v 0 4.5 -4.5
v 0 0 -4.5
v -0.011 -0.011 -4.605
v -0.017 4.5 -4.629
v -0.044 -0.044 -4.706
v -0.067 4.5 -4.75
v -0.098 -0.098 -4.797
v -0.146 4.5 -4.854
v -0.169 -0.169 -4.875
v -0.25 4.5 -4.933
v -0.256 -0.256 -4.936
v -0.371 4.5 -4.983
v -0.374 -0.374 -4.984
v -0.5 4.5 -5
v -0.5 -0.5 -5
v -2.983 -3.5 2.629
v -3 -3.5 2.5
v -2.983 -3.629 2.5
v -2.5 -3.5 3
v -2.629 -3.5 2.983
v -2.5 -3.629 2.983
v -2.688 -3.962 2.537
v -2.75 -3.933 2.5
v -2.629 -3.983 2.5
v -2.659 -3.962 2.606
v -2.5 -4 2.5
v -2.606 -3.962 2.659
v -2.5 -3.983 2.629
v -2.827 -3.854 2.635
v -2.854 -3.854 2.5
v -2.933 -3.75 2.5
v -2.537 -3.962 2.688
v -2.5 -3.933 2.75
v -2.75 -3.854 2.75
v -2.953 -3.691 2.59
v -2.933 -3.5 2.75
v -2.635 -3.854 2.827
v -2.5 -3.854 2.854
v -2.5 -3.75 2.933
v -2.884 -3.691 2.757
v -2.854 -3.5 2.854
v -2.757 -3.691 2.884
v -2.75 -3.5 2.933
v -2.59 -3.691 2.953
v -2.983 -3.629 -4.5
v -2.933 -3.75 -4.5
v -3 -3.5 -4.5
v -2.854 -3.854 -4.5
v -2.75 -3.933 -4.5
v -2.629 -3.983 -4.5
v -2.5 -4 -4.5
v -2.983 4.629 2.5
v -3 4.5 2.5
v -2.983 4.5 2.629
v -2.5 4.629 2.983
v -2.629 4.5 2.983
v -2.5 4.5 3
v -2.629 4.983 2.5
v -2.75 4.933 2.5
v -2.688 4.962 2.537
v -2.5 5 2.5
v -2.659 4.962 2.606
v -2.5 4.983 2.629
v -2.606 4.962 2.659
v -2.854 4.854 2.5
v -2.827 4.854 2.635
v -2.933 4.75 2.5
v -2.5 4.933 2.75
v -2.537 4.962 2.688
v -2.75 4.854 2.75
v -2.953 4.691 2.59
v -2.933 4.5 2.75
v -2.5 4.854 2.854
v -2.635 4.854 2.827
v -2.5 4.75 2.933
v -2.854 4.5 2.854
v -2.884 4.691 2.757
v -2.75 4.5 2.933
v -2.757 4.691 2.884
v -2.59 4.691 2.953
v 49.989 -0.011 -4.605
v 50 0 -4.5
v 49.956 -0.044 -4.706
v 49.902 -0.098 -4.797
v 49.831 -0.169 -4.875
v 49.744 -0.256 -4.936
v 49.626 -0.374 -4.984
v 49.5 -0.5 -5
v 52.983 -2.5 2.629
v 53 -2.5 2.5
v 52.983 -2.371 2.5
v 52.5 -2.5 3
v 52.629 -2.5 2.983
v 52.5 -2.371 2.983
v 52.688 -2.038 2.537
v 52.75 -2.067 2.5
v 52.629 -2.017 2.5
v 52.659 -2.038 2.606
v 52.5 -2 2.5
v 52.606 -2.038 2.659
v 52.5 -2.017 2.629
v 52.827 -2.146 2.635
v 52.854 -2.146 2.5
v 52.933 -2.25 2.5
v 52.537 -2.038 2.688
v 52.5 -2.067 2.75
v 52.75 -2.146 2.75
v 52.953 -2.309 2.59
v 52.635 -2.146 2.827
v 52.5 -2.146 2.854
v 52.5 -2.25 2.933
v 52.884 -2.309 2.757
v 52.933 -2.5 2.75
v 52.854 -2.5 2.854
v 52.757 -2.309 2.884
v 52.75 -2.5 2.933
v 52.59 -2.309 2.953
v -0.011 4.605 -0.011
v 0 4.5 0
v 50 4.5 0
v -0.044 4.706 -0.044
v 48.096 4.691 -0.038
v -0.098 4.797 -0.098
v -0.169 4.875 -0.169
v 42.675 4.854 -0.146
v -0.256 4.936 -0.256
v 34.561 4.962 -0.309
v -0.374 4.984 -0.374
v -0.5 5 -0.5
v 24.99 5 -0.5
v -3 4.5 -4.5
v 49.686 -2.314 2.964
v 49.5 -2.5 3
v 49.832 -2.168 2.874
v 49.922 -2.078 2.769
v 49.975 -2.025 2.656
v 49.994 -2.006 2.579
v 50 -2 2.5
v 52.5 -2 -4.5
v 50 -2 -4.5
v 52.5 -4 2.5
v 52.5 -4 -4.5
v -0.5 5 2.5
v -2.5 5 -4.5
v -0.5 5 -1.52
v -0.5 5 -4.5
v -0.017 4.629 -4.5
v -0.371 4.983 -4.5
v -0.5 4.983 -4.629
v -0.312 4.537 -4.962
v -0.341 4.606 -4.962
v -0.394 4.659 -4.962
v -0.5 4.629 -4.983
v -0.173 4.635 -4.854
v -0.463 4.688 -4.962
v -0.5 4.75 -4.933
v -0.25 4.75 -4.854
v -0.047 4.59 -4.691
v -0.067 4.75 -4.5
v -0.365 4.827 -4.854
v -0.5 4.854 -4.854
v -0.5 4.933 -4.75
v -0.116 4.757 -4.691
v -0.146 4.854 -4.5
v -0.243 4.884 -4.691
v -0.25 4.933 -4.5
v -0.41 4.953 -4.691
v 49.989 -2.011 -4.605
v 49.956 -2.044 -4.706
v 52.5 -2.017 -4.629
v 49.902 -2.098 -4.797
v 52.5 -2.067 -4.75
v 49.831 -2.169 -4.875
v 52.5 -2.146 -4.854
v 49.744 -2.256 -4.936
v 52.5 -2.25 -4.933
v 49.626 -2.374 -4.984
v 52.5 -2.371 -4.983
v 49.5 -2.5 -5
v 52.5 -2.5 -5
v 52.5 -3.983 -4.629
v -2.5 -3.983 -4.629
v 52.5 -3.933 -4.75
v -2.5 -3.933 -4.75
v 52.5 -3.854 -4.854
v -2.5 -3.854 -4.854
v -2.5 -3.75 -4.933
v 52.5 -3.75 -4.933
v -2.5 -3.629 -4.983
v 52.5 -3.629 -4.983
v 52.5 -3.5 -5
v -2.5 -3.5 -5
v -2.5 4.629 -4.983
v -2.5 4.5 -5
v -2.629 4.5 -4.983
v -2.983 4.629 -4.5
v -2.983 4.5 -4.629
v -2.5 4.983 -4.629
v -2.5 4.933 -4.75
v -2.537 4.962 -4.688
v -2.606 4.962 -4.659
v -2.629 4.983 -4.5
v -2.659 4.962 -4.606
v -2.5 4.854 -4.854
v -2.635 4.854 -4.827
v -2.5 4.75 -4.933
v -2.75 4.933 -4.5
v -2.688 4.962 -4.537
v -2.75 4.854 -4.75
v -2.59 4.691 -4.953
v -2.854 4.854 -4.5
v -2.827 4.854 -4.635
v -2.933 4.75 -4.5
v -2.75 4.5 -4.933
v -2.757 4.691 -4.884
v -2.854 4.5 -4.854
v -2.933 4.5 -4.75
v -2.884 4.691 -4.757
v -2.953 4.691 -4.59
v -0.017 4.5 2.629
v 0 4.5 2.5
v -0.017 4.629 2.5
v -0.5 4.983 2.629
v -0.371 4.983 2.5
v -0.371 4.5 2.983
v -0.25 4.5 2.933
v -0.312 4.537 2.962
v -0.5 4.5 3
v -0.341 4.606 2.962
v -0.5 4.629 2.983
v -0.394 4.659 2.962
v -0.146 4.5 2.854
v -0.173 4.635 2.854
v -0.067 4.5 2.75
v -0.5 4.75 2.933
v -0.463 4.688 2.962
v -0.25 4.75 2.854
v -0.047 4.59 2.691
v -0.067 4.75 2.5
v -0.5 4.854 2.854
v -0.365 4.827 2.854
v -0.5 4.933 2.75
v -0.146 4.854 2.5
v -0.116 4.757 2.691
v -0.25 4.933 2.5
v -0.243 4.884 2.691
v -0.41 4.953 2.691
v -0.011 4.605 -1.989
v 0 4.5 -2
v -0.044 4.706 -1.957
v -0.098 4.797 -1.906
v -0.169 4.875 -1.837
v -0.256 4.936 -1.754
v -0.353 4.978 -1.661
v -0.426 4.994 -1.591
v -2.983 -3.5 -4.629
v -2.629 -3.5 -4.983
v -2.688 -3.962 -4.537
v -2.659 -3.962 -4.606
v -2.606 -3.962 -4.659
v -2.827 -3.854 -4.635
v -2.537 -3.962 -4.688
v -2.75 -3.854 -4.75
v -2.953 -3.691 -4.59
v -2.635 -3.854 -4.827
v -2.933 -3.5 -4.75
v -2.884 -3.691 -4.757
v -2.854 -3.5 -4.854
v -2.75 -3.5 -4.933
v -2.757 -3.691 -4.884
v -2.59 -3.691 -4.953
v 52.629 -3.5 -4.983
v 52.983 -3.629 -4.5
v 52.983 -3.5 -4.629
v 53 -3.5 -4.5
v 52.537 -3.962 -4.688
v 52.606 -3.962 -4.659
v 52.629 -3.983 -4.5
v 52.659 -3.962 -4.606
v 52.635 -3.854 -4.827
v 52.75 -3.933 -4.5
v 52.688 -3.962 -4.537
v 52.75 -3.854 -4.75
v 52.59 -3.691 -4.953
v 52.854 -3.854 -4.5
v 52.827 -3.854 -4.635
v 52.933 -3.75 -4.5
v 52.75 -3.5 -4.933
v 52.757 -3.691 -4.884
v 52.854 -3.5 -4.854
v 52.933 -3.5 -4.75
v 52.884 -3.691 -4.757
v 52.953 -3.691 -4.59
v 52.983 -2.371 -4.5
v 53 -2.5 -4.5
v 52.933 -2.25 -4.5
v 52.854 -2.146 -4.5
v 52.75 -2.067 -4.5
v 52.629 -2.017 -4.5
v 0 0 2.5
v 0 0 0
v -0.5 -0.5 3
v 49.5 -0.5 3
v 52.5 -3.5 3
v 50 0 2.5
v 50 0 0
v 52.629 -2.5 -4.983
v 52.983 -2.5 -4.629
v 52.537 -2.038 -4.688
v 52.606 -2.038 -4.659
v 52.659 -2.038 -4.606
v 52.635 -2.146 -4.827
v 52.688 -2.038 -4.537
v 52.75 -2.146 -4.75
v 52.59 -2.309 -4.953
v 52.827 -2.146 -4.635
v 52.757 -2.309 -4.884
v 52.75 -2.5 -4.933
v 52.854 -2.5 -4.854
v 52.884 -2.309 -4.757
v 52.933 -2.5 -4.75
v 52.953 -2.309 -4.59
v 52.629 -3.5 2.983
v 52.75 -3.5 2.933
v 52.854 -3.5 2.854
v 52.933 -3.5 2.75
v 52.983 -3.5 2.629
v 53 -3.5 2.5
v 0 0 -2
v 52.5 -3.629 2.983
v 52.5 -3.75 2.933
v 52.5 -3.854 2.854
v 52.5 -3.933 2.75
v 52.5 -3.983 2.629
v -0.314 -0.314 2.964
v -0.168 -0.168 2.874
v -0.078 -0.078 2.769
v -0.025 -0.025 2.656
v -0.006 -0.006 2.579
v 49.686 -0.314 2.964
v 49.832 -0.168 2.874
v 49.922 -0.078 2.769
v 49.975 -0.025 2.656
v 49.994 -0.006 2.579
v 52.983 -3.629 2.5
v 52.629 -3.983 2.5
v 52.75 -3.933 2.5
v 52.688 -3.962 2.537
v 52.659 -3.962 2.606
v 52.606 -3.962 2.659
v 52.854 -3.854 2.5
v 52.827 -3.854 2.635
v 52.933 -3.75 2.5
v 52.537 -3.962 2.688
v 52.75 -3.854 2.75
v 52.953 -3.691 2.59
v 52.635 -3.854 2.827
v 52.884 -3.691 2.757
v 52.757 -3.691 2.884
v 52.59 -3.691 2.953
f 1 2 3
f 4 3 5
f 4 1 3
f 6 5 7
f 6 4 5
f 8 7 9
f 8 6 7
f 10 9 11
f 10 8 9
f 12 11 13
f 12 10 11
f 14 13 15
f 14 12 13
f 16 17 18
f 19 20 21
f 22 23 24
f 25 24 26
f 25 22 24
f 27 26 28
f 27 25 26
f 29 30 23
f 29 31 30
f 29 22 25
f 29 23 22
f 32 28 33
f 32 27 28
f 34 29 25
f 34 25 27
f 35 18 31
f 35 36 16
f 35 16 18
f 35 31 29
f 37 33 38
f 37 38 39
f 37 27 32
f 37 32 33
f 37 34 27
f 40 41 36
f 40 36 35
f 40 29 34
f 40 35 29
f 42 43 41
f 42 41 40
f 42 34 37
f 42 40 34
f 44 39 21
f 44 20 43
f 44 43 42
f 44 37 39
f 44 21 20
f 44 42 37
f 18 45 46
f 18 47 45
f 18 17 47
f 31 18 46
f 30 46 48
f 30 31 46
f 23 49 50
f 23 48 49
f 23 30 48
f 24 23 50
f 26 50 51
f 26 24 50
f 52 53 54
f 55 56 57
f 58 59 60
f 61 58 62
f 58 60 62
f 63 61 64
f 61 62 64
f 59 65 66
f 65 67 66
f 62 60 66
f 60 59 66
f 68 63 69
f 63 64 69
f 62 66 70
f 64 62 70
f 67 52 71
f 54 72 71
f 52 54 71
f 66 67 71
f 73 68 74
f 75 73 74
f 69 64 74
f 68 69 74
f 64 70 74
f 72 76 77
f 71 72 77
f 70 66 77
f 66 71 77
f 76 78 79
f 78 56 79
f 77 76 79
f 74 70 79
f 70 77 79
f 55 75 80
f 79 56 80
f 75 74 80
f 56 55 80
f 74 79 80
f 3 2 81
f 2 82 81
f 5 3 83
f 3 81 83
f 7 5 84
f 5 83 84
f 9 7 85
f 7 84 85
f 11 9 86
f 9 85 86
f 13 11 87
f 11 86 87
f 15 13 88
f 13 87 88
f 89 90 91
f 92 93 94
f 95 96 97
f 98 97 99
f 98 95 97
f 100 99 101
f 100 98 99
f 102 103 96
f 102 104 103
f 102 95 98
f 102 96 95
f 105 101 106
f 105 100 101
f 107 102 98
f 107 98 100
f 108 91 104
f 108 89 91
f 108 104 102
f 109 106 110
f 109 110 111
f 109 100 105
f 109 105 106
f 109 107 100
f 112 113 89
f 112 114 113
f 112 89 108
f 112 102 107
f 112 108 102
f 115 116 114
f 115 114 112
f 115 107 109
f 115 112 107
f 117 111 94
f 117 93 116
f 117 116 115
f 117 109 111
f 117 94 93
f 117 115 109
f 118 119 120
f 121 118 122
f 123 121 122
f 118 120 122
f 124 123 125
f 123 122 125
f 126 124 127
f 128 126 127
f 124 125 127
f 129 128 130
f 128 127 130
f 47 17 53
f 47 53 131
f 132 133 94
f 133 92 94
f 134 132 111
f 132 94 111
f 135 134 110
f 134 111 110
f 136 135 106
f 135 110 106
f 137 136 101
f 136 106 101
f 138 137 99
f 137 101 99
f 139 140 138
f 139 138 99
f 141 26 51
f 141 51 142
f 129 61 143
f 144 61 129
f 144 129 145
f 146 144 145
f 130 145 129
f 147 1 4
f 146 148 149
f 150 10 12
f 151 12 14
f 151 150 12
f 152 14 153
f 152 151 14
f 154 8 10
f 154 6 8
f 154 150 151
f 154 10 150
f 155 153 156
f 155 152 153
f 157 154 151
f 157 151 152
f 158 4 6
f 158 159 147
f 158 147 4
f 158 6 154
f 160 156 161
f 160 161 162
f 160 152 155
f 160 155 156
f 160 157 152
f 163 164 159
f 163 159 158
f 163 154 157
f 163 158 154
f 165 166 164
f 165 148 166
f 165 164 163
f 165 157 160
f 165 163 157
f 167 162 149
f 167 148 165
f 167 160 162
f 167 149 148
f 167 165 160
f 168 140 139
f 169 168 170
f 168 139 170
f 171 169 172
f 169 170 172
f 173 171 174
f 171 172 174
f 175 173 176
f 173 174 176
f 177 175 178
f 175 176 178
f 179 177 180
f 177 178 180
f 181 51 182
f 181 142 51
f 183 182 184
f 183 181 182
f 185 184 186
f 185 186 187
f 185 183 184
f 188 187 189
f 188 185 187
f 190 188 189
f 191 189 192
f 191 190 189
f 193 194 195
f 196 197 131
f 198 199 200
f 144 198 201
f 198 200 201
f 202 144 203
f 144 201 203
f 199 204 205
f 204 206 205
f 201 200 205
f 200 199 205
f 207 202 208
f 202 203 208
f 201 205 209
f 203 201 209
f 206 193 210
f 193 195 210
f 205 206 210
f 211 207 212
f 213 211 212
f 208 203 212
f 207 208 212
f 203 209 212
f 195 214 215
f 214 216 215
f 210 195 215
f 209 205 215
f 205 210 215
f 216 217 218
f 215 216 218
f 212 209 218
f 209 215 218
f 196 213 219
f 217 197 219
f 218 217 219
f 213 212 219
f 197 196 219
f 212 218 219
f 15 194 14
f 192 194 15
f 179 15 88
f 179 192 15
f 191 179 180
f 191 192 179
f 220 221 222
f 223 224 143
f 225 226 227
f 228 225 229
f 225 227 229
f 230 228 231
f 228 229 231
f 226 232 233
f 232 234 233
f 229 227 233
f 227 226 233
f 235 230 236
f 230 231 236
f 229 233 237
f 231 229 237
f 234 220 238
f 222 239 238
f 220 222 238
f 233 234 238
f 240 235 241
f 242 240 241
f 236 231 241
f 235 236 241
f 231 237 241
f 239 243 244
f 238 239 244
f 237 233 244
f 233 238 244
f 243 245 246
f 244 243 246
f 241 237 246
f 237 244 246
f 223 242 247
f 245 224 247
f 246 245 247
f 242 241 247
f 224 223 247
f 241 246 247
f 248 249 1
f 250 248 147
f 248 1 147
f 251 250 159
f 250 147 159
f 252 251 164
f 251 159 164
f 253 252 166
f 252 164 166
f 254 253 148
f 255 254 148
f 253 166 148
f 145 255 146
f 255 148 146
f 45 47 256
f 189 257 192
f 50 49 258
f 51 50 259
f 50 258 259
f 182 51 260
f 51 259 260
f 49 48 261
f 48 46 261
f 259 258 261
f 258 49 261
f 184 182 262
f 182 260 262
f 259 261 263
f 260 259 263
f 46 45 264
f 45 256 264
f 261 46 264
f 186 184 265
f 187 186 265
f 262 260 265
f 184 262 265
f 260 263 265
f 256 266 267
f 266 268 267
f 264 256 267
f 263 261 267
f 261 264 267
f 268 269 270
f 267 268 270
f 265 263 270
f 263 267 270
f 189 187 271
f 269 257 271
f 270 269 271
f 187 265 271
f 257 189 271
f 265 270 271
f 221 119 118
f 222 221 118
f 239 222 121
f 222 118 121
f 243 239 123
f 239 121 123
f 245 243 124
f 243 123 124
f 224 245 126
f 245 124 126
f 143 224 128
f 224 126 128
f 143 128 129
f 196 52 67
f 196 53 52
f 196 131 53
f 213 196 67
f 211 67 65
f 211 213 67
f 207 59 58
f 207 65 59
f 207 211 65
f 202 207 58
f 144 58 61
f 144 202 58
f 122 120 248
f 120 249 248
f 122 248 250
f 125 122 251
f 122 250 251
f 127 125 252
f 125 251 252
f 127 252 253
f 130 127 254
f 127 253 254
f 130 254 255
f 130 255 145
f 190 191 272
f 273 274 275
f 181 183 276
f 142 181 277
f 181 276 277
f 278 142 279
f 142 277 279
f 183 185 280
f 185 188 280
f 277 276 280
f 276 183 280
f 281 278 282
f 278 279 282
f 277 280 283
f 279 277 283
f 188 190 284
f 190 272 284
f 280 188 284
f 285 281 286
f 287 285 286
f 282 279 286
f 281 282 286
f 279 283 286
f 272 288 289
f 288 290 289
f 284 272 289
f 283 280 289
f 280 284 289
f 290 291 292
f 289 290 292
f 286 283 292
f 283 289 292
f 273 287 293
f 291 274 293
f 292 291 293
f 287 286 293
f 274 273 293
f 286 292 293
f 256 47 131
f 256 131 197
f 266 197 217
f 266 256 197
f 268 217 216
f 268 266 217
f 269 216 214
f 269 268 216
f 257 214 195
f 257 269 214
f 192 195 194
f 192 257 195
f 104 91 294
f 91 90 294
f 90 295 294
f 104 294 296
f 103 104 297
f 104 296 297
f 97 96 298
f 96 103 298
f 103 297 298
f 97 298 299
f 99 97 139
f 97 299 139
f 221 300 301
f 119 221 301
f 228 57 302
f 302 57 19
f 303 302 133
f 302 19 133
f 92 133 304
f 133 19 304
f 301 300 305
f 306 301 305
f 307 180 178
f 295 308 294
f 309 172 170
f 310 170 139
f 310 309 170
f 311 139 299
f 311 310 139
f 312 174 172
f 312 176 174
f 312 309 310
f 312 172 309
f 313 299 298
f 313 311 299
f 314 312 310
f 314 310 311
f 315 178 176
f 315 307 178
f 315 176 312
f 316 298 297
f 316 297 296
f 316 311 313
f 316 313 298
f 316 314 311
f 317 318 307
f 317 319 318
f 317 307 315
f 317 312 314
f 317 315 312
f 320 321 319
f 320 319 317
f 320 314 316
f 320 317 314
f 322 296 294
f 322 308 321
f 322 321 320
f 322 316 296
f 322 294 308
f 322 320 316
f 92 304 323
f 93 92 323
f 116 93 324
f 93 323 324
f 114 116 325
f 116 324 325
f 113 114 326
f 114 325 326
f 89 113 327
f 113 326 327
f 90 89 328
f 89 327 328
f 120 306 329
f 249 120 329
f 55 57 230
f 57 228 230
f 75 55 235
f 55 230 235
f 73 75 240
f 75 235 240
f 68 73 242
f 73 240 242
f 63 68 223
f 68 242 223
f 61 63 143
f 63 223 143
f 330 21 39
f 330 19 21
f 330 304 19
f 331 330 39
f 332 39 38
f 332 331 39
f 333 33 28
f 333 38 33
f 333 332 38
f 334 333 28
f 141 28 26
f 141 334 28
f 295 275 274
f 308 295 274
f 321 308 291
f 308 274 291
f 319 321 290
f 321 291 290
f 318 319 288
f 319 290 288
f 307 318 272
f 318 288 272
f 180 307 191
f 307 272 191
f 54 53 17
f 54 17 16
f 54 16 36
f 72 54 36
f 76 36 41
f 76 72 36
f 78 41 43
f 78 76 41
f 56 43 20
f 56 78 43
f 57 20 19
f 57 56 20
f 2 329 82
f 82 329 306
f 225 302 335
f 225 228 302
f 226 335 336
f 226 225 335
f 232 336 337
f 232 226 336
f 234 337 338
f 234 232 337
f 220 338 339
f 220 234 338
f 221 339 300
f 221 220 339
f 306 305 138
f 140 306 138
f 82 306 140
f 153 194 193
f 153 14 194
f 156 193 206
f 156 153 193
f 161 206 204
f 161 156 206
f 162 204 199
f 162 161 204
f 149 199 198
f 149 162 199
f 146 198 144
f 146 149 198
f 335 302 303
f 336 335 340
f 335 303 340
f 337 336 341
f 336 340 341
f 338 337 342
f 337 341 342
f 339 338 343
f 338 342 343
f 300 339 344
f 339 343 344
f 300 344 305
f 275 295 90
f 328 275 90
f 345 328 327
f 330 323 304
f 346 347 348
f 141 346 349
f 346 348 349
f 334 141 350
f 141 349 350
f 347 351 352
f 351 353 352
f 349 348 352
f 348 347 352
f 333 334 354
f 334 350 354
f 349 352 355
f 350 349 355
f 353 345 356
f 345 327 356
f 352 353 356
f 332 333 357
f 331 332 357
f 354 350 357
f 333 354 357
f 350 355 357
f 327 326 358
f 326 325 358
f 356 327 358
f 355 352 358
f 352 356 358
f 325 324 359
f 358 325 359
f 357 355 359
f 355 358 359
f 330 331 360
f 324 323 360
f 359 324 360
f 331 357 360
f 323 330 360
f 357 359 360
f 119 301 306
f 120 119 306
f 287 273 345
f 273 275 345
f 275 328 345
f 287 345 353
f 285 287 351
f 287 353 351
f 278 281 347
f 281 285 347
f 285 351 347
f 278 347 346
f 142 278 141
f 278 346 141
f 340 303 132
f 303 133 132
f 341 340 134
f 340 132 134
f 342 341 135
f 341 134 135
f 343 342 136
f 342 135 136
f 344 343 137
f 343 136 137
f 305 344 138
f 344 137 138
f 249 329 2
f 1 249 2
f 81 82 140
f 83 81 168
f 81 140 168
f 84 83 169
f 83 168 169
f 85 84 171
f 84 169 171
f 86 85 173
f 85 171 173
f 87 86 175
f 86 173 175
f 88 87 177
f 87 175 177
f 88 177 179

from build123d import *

# Parameters (mm, degrees)
BOSS_EXTRUDE1_DEPTH = 5
SKETCH2_W           = 56
SKETCH2_H           = 8
BOSS_EXTRUDE2_DEPTH = 4
SKETCH3_3_W         = 3
SKETCH3_3_H         = 8
CUT_EXTRUDE2_DEPTH  = 2
SKETCH3_W           = 3
SKETCH3_H           = 8
BOSS_EXTRUDE4_DEPTH = 5
FILLET1_R           = 0.5


with BuildPart() as part:
    # Sketch1 → Boss-Extrude1 (new body)
    with BuildSketch(Plane(origin=(0, 0, 0), x_dir=(1, 0, 0), z_dir=(0, 1, 0))):
        Polygon((0, 0), (50, 0), (0, 2), align=None)
    extrude(amount=BOSS_EXTRUDE1_DEPTH)

    # Sketch2 → Boss-Extrude2 (add)
    with BuildSketch(Plane.XZ):
        with Locations((25, -1)):
            Rectangle(SKETCH2_W, SKETCH2_H)
    extrude(amount=BOSS_EXTRUDE2_DEPTH)

    # Sketch3<3> → Cut-Extrude2 (cut)
    with BuildSketch(Plane(origin=(0, 0, 0), x_dir=(1, 0, 0), z_dir=(0, 1, 0))):
        with Locations((51.5, 1)):
            Rectangle(SKETCH3_3_W, SKETCH3_3_H)
    extrude(amount=-CUT_EXTRUDE2_DEPTH, mode=Mode.SUBTRACT)

    # Sketch3 → Boss-Extrude4 (add)
    with BuildSketch(Plane(origin=(0, 0, 0), x_dir=(1, 0, 0), z_dir=(0, 1, 0))):
        with Locations((-1.5, 1)):
            Rectangle(SKETCH3_W, SKETCH3_H)
        with Locations((51.5, 1)):
            Rectangle(SKETCH3_W, SKETCH3_H)
    extrude(amount=BOSS_EXTRUDE4_DEPTH)


with BuildPart() as boss_extrude4_kept_piece:
    # of the separate pieces the step leaves, the one the design keeps (boss_extrude4_pieces_kept)
    add(part.part.solids().sort_by_distance((0, 0, 3))[0])

    # Fillet1
    fillet1_edges = [boss_extrude4_kept_piece.edges().sort_by_distance(p)[0] for p in [
        (-3, 0.5, 3),
        (25, 5, -1),
        (-3, 0.5, -5),
        (53, -3, -5),
        (53, -3, 3),
        (-3, -4, -1),
        (25, -4, -5),
        (53, -4, -1),
        (25, -4, 3),
        (25, 0, 3),
        (51.5, -2, -5),
        (50, -1, -5),
        (53, -2, -1),
        (51.5, -2, 3),
        (50, -1, 3),
        (25, 0, -5),
        (0, 5, 1.5),
        (0, 2.5, 3),
        (0, 5, -3.5),
        (0, 2.5, -5),
        (-1.5, 5, -5),
        (-3, 5, -1),
        (-1.5, 5, 3),
        (25, 5, 0),
    ]]
    fillet(fillet1_edges, radius=FILLET1_R)


solid = boss_extrude4_kept_piece.part
